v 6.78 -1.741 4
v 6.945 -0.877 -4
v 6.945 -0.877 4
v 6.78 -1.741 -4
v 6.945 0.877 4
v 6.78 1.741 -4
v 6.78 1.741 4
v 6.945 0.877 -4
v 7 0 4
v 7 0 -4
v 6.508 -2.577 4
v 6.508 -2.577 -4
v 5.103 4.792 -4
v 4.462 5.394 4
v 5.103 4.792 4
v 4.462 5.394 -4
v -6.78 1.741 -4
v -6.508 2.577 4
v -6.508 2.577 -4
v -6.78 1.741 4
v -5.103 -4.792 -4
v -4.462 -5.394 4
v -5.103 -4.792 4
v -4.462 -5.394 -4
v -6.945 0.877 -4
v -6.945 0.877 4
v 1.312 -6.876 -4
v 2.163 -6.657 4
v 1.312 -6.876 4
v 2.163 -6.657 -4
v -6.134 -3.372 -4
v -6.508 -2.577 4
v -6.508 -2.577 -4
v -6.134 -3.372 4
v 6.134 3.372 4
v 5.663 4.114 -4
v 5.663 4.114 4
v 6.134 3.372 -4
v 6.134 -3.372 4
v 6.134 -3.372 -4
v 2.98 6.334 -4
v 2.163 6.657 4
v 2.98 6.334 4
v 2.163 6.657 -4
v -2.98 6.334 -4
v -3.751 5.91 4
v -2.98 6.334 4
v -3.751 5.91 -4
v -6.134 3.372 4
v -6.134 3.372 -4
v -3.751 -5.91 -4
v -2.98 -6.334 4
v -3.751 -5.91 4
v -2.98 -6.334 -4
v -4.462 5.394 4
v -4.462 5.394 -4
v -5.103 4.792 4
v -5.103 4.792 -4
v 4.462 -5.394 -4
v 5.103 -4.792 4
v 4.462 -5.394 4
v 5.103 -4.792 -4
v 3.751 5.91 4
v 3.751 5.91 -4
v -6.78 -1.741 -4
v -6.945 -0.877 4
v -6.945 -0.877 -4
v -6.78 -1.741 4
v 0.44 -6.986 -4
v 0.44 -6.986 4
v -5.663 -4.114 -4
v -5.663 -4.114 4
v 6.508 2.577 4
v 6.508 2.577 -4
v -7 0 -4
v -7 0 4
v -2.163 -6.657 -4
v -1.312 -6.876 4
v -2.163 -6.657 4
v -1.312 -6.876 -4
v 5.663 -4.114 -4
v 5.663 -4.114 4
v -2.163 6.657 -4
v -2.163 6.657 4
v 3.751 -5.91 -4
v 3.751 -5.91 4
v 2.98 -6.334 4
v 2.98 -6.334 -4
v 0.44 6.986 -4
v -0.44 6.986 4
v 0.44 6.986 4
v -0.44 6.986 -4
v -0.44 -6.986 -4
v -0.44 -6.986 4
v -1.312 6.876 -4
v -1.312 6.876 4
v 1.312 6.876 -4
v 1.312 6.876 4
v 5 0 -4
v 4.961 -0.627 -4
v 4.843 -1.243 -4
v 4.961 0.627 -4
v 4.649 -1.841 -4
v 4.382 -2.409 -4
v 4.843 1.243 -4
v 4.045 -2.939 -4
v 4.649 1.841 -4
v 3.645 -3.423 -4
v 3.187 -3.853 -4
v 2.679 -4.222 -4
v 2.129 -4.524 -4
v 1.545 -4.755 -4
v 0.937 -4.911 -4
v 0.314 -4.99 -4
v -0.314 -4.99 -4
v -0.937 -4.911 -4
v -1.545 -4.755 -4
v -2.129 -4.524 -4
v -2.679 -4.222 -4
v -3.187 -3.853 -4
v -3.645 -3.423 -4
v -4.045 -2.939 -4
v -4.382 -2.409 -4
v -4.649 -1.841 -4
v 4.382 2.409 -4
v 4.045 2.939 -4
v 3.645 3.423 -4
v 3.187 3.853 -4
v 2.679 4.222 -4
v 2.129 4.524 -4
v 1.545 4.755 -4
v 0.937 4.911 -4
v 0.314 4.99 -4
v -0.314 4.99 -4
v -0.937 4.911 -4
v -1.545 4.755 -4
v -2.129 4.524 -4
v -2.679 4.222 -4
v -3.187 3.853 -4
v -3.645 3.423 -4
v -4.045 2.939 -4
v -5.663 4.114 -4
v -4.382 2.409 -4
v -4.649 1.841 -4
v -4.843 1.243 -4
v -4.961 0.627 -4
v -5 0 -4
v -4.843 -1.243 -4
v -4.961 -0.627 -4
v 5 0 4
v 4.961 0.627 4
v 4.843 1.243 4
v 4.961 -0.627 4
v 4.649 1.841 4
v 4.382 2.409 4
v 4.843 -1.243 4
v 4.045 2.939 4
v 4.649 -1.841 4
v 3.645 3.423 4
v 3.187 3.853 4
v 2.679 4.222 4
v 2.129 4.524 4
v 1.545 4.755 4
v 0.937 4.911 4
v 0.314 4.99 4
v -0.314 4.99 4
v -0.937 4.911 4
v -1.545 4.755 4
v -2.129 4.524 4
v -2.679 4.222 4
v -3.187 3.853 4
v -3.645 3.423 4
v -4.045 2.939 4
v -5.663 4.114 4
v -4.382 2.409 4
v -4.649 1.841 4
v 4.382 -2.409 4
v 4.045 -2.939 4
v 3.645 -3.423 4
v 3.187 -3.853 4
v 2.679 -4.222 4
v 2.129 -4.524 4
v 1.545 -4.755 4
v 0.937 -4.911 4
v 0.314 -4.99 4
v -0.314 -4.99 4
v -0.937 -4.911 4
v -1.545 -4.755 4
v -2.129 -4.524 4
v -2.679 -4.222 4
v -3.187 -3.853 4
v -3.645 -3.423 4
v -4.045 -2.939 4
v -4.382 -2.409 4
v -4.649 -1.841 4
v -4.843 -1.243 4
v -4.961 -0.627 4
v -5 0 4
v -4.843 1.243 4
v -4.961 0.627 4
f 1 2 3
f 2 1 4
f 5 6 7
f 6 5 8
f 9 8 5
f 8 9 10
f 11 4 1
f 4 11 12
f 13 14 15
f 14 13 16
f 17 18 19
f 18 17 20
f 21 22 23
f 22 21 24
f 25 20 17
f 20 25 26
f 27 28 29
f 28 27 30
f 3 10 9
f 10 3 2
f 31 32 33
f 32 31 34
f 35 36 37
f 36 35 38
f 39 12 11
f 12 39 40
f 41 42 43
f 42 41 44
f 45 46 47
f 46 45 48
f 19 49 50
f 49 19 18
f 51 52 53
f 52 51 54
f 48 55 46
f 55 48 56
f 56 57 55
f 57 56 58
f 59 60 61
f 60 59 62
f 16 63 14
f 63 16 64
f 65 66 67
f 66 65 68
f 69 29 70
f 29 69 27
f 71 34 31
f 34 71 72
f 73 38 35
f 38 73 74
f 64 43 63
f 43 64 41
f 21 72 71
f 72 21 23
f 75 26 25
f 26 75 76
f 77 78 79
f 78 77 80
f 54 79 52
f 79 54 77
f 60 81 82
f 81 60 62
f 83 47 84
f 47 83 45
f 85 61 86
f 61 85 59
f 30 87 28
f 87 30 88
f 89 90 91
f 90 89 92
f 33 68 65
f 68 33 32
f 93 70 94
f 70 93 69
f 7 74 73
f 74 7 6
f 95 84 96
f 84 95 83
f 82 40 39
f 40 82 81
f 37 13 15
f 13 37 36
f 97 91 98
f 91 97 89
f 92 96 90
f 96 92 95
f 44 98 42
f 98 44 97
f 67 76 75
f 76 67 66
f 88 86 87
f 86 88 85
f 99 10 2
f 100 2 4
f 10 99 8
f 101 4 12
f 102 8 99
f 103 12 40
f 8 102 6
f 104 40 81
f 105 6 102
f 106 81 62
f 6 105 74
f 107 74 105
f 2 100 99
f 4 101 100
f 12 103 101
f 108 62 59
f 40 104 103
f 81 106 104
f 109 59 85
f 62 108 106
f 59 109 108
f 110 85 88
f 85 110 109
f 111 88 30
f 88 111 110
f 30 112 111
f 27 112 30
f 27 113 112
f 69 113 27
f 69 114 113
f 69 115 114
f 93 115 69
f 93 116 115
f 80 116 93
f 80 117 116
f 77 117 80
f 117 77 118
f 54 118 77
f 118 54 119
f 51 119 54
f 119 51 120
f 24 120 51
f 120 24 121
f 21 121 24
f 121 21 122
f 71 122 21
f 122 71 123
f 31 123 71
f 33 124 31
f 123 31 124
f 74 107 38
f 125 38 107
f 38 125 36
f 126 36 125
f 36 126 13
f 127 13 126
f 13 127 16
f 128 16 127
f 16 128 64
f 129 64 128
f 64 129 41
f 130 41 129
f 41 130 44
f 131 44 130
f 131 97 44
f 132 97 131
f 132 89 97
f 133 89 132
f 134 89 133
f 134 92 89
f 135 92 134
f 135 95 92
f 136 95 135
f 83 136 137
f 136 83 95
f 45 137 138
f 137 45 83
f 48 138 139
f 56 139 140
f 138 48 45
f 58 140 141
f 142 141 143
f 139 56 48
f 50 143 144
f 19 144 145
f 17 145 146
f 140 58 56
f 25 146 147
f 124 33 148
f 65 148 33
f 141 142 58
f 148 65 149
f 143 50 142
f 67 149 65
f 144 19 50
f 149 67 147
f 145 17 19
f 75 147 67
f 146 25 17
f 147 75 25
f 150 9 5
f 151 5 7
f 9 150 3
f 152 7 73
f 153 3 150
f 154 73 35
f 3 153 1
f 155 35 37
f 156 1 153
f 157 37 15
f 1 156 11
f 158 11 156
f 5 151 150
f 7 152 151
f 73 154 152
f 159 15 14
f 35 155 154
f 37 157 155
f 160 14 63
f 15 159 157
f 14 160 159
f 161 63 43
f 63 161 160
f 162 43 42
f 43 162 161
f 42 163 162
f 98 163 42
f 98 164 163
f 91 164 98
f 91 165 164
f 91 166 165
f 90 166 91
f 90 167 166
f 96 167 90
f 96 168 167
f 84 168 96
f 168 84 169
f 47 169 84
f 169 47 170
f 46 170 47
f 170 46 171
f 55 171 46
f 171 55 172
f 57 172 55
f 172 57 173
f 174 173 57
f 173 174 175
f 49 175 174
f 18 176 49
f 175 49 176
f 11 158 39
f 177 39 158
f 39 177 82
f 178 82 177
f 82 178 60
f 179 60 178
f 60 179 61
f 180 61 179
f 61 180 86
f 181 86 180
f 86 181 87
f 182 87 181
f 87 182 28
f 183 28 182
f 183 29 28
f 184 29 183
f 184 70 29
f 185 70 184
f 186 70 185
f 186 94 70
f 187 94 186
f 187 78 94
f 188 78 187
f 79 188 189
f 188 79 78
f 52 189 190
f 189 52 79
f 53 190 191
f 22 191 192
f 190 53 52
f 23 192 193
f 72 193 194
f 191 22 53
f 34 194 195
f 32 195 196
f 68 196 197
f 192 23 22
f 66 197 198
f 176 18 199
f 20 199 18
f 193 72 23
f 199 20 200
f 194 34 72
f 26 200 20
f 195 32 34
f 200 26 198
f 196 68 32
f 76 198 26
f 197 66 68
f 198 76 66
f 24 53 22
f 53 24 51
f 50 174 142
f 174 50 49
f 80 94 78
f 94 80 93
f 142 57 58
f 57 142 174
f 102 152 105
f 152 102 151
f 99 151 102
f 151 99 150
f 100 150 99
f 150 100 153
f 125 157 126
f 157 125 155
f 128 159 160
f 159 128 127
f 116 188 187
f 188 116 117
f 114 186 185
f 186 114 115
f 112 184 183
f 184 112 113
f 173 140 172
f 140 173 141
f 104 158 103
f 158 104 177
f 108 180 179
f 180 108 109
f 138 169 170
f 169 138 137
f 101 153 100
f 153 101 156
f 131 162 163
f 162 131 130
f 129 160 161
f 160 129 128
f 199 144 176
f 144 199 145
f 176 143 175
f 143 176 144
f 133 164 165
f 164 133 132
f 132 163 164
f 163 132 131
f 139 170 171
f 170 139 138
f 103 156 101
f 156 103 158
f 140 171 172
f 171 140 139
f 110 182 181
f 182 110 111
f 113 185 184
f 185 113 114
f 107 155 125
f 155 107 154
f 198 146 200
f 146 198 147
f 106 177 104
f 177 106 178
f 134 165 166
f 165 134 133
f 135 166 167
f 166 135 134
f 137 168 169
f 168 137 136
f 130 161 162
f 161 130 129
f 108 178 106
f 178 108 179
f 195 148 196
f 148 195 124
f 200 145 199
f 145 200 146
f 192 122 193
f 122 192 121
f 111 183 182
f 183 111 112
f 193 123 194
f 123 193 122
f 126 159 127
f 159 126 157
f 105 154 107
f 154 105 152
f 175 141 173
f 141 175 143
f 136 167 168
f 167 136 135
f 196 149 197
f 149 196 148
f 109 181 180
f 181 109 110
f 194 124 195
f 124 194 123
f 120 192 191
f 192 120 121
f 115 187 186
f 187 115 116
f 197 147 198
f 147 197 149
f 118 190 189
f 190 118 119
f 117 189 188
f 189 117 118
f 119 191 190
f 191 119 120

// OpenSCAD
$fn = 50;


difference() {
	union() {
		translate(v = [0, 0, -4.0000000000]) {
			cylinder(h = 8, r = 7.0000000000);
		}
	}
	union() {
		translate(v = [0, 0, -100.0000000000]) {
			cylinder(h = 200, r = 5.0000000000);
		}
	}
}
